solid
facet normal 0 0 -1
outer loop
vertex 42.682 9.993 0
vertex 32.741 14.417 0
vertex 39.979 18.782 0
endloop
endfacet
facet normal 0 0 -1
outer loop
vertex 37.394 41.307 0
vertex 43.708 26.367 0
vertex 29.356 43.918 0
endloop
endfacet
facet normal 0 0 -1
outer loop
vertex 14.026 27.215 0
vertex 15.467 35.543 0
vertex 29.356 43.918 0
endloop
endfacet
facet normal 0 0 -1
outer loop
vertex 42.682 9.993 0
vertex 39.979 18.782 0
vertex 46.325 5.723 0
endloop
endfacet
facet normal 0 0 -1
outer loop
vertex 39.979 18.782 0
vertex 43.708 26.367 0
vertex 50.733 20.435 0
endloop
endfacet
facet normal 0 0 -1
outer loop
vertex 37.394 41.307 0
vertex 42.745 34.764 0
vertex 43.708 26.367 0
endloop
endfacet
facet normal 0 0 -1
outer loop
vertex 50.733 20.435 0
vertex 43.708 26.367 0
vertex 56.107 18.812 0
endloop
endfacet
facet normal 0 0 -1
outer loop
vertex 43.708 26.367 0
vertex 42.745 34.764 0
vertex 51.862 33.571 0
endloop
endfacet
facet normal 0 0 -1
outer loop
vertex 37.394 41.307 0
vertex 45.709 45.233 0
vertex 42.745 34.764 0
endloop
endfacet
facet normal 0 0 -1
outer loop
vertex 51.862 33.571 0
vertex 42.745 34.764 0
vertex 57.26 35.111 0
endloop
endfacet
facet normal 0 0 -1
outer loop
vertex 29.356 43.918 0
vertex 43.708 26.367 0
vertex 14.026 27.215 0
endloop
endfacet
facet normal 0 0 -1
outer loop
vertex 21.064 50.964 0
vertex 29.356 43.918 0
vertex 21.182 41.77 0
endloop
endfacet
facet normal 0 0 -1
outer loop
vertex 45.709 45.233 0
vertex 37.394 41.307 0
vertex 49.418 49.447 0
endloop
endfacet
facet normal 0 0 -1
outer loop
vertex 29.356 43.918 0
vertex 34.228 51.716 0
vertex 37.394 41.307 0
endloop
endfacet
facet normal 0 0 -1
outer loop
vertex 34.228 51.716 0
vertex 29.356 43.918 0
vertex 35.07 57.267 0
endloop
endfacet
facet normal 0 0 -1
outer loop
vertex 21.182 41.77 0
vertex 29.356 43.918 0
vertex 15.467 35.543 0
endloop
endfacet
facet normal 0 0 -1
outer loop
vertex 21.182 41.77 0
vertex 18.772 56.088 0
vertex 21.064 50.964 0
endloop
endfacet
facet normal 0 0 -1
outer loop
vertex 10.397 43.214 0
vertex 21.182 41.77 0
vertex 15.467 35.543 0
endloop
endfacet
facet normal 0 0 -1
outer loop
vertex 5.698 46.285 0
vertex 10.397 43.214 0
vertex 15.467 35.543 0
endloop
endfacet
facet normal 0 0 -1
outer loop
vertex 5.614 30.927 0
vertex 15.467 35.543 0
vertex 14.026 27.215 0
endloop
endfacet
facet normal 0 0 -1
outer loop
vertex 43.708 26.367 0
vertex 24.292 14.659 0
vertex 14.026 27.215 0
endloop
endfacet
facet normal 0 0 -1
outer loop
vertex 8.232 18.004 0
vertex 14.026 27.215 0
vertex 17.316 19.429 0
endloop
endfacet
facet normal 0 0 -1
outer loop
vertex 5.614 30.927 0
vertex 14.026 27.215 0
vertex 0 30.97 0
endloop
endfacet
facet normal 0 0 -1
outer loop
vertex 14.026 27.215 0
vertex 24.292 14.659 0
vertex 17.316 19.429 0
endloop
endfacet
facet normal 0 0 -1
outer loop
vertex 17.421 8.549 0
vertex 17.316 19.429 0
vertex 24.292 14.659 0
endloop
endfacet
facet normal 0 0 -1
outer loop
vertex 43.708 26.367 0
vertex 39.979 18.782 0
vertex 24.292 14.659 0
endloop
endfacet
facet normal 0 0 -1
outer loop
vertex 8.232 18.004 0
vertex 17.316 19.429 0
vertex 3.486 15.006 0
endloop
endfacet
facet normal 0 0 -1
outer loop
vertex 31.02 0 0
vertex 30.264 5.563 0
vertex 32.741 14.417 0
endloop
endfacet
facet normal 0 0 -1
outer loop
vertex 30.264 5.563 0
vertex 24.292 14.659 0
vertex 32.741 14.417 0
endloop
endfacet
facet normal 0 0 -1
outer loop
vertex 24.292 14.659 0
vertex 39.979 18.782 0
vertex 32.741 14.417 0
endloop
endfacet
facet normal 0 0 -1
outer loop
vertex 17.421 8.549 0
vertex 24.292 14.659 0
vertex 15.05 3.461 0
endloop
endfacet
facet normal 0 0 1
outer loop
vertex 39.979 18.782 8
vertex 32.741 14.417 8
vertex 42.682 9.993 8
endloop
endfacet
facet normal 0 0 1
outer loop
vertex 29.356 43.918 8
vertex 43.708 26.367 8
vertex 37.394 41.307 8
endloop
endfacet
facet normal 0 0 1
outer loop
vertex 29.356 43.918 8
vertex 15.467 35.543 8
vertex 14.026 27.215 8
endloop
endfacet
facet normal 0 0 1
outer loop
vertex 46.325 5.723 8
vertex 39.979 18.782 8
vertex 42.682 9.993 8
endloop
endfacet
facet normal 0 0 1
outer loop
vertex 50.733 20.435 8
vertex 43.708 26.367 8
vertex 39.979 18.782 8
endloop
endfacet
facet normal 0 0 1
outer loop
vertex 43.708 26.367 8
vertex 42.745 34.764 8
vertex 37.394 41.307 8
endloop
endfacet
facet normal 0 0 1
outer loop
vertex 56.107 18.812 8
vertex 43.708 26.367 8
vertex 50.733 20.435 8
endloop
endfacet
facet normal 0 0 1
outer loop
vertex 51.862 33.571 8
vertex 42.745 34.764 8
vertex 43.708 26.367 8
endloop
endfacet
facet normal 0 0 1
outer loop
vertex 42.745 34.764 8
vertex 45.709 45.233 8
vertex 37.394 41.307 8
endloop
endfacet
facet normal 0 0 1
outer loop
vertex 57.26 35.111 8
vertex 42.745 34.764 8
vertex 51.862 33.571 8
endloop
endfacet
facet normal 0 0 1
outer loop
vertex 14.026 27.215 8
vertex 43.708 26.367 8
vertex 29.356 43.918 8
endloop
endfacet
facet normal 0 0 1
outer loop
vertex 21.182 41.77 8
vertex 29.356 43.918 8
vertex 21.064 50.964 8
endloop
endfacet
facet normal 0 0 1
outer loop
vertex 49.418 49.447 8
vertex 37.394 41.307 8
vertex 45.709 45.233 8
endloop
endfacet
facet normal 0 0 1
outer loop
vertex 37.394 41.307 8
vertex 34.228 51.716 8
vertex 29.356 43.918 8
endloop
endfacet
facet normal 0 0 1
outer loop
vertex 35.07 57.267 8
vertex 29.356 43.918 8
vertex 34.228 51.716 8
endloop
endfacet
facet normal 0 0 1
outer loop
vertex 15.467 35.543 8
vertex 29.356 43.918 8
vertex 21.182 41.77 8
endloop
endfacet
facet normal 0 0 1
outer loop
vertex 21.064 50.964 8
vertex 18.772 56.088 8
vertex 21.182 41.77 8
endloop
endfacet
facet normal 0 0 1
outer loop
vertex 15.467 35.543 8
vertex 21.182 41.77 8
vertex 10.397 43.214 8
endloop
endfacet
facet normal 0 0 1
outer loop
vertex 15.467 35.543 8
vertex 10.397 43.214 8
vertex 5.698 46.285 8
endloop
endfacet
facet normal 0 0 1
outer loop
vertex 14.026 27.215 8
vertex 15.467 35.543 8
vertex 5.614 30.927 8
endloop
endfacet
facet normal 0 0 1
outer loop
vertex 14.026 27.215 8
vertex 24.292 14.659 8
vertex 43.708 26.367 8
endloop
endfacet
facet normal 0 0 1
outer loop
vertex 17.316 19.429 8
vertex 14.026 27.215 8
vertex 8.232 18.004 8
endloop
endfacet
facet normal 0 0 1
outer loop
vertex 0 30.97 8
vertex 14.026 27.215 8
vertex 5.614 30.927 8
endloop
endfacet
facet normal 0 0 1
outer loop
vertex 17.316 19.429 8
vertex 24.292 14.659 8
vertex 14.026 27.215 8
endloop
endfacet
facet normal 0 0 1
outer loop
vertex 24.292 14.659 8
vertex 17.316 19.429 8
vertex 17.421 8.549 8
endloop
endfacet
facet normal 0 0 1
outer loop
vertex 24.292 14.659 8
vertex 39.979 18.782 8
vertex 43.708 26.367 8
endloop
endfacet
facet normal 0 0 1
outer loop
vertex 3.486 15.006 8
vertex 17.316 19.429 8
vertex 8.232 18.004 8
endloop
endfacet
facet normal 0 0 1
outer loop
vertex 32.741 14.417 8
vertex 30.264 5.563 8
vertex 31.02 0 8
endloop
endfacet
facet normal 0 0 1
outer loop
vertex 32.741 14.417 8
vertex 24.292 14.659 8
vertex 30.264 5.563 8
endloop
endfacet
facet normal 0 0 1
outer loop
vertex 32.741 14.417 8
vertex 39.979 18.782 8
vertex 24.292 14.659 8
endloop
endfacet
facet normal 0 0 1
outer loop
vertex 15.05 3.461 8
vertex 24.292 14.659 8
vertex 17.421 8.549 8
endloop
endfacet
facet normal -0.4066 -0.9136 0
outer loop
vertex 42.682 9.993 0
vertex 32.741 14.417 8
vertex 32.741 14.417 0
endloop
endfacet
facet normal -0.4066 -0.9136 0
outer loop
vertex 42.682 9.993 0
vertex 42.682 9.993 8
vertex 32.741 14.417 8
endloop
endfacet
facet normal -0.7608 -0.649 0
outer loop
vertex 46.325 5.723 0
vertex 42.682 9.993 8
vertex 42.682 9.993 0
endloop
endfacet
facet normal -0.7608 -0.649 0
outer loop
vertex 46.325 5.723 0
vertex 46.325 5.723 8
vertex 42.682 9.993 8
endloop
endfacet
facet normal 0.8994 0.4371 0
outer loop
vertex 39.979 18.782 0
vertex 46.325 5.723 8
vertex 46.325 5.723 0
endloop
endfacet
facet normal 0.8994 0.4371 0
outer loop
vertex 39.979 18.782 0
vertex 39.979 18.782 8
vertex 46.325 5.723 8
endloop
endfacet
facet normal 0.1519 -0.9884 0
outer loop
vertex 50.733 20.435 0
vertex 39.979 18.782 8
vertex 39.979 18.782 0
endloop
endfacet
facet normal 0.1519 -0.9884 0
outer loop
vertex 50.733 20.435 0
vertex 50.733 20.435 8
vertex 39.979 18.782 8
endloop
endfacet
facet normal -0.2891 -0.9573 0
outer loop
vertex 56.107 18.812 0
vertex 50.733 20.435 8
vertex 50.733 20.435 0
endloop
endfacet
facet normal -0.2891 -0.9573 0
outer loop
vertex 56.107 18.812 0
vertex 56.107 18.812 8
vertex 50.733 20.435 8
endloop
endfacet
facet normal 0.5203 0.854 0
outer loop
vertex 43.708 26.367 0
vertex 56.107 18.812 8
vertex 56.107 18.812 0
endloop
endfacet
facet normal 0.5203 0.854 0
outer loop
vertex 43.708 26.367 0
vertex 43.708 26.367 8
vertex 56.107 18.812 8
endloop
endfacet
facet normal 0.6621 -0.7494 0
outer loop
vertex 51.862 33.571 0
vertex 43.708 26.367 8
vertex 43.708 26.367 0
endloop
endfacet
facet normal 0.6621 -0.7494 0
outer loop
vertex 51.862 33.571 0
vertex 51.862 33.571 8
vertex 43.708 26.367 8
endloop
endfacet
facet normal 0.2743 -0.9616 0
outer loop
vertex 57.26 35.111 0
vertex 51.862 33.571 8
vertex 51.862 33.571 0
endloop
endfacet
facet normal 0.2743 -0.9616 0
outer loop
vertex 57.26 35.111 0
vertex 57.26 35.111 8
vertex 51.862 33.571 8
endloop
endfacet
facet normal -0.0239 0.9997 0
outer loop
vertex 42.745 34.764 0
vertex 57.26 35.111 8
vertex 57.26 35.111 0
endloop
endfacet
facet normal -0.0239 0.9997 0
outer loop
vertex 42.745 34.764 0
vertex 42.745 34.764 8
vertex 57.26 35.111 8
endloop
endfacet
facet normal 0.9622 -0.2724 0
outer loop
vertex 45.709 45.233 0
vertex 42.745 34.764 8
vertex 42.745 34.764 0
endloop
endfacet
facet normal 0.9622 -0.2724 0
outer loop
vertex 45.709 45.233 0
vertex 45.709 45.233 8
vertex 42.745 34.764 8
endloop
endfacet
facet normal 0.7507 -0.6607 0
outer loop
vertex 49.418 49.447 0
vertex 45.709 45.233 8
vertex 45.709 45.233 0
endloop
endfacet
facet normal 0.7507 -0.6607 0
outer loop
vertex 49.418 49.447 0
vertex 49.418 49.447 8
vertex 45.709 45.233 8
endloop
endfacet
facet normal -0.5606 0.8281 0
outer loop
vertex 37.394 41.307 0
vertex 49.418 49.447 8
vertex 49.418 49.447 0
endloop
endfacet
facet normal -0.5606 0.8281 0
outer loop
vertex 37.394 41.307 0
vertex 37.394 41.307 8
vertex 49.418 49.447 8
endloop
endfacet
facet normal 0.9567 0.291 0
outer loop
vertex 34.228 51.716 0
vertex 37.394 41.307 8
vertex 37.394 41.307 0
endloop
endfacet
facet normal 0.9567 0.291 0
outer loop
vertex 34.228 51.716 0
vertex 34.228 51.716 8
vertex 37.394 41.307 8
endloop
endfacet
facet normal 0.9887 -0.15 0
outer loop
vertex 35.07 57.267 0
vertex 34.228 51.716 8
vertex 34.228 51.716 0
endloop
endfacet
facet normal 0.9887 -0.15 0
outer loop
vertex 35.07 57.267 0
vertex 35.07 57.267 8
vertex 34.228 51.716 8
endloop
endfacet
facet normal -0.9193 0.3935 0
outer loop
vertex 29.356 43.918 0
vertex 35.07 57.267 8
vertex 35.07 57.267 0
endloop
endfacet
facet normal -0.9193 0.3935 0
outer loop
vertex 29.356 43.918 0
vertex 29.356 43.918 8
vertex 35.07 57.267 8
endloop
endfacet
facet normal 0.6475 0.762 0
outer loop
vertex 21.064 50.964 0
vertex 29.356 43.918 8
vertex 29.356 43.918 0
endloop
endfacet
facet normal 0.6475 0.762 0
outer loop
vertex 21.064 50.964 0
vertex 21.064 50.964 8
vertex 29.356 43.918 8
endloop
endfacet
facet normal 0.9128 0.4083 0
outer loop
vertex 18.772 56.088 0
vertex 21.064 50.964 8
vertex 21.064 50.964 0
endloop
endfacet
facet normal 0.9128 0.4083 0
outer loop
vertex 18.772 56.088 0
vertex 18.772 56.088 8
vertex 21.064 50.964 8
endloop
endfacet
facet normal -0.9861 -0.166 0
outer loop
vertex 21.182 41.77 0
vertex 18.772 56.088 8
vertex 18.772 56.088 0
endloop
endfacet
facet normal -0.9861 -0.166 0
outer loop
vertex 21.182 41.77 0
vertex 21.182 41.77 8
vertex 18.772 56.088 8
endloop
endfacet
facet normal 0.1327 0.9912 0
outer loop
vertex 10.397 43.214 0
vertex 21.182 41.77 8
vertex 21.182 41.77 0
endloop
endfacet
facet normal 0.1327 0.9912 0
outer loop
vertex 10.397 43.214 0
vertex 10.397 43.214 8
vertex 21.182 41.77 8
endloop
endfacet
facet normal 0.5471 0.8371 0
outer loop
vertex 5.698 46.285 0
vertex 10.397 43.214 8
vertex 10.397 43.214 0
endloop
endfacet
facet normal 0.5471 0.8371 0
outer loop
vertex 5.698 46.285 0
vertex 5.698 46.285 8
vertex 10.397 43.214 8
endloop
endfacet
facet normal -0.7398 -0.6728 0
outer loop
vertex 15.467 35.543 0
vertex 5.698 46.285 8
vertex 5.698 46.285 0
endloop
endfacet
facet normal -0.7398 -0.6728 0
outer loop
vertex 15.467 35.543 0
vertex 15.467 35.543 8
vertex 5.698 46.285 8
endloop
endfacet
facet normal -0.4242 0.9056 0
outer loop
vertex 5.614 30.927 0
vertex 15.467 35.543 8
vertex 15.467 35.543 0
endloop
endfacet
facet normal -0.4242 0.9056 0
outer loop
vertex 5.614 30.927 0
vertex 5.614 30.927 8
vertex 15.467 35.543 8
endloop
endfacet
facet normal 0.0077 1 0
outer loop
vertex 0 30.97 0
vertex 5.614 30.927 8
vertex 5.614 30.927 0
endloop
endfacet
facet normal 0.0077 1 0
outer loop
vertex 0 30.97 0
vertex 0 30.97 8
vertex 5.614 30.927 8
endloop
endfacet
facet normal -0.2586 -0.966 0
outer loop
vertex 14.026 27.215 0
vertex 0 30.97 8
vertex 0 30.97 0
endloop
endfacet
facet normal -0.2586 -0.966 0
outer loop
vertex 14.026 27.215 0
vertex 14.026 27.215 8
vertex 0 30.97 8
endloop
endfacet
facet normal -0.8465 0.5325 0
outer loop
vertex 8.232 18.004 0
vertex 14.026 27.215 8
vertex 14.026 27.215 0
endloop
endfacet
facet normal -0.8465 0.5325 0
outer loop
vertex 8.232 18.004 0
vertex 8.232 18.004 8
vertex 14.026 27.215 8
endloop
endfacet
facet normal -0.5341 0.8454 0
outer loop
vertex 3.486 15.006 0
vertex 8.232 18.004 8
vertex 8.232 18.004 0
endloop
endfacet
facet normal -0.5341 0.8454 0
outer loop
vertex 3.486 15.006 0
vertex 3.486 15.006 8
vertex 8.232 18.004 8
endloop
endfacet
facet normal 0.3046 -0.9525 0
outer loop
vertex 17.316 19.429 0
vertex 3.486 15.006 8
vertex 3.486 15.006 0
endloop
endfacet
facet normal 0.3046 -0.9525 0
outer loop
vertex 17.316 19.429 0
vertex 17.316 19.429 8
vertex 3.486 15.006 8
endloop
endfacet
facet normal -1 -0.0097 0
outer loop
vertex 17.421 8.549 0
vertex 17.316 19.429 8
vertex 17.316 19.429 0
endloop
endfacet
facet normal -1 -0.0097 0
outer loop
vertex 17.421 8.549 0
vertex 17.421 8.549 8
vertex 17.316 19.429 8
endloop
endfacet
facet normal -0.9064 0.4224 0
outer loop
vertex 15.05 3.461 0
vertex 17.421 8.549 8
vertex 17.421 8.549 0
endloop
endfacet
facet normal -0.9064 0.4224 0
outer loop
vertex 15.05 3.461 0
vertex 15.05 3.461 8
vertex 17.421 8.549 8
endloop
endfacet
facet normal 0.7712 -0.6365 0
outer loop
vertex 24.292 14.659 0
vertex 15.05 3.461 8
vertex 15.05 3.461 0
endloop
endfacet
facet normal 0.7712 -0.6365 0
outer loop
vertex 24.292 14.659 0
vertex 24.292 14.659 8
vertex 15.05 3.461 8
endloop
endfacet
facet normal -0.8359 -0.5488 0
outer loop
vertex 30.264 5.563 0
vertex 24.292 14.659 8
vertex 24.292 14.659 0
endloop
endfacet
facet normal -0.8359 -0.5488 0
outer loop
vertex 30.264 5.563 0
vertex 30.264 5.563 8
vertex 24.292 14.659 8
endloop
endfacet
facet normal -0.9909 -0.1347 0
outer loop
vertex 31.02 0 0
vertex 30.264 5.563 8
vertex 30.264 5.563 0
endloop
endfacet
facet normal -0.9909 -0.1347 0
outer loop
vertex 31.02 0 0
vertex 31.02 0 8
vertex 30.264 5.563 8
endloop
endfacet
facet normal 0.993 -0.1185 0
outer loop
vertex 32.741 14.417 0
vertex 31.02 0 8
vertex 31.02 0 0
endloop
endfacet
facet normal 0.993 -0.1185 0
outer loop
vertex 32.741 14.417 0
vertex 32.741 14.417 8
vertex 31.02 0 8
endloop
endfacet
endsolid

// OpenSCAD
$fn = 32;

// ----------------------------------------------------------------------
// Fan rotor section: 11 blades, 15 mm hub radius, 14 mm blades
// ----------------------------------------------------------------------

// --- parameters (mm) ---
profile_height = 8;       // extrusion height
profile_points = 33;      // points of the closed outline

profile = [[43.708, 26.367], [51.862, 33.571], [57.26, 35.111], [42.745, 34.764], [45.709, 45.233], [49.418, 49.447], [37.394, 41.307], [34.228, 51.716], [35.07, 57.267], [29.356, 43.918], [21.064, 50.964], [18.772, 56.088], [21.182, 41.77], [10.397, 43.214], [5.698, 46.285], [15.467, 35.543], [5.614, 30.927], [0, 30.97], [14.026, 27.215], [8.232, 18.004], [3.486, 15.006], [17.316, 19.429], [17.421, 8.549], [15.05, 3.461], [24.292, 14.659], [30.264, 5.563], [31.02, 0], [32.741, 14.417], [42.682, 9.993], [46.325, 5.723], [39.979, 18.782], [50.733, 20.435], [56.107, 18.812]];  // single closed polygon, 33 points, counter clockwise

// --- the one profile operation ---
linear_extrude(height = profile_height) polygon(points = profile);
